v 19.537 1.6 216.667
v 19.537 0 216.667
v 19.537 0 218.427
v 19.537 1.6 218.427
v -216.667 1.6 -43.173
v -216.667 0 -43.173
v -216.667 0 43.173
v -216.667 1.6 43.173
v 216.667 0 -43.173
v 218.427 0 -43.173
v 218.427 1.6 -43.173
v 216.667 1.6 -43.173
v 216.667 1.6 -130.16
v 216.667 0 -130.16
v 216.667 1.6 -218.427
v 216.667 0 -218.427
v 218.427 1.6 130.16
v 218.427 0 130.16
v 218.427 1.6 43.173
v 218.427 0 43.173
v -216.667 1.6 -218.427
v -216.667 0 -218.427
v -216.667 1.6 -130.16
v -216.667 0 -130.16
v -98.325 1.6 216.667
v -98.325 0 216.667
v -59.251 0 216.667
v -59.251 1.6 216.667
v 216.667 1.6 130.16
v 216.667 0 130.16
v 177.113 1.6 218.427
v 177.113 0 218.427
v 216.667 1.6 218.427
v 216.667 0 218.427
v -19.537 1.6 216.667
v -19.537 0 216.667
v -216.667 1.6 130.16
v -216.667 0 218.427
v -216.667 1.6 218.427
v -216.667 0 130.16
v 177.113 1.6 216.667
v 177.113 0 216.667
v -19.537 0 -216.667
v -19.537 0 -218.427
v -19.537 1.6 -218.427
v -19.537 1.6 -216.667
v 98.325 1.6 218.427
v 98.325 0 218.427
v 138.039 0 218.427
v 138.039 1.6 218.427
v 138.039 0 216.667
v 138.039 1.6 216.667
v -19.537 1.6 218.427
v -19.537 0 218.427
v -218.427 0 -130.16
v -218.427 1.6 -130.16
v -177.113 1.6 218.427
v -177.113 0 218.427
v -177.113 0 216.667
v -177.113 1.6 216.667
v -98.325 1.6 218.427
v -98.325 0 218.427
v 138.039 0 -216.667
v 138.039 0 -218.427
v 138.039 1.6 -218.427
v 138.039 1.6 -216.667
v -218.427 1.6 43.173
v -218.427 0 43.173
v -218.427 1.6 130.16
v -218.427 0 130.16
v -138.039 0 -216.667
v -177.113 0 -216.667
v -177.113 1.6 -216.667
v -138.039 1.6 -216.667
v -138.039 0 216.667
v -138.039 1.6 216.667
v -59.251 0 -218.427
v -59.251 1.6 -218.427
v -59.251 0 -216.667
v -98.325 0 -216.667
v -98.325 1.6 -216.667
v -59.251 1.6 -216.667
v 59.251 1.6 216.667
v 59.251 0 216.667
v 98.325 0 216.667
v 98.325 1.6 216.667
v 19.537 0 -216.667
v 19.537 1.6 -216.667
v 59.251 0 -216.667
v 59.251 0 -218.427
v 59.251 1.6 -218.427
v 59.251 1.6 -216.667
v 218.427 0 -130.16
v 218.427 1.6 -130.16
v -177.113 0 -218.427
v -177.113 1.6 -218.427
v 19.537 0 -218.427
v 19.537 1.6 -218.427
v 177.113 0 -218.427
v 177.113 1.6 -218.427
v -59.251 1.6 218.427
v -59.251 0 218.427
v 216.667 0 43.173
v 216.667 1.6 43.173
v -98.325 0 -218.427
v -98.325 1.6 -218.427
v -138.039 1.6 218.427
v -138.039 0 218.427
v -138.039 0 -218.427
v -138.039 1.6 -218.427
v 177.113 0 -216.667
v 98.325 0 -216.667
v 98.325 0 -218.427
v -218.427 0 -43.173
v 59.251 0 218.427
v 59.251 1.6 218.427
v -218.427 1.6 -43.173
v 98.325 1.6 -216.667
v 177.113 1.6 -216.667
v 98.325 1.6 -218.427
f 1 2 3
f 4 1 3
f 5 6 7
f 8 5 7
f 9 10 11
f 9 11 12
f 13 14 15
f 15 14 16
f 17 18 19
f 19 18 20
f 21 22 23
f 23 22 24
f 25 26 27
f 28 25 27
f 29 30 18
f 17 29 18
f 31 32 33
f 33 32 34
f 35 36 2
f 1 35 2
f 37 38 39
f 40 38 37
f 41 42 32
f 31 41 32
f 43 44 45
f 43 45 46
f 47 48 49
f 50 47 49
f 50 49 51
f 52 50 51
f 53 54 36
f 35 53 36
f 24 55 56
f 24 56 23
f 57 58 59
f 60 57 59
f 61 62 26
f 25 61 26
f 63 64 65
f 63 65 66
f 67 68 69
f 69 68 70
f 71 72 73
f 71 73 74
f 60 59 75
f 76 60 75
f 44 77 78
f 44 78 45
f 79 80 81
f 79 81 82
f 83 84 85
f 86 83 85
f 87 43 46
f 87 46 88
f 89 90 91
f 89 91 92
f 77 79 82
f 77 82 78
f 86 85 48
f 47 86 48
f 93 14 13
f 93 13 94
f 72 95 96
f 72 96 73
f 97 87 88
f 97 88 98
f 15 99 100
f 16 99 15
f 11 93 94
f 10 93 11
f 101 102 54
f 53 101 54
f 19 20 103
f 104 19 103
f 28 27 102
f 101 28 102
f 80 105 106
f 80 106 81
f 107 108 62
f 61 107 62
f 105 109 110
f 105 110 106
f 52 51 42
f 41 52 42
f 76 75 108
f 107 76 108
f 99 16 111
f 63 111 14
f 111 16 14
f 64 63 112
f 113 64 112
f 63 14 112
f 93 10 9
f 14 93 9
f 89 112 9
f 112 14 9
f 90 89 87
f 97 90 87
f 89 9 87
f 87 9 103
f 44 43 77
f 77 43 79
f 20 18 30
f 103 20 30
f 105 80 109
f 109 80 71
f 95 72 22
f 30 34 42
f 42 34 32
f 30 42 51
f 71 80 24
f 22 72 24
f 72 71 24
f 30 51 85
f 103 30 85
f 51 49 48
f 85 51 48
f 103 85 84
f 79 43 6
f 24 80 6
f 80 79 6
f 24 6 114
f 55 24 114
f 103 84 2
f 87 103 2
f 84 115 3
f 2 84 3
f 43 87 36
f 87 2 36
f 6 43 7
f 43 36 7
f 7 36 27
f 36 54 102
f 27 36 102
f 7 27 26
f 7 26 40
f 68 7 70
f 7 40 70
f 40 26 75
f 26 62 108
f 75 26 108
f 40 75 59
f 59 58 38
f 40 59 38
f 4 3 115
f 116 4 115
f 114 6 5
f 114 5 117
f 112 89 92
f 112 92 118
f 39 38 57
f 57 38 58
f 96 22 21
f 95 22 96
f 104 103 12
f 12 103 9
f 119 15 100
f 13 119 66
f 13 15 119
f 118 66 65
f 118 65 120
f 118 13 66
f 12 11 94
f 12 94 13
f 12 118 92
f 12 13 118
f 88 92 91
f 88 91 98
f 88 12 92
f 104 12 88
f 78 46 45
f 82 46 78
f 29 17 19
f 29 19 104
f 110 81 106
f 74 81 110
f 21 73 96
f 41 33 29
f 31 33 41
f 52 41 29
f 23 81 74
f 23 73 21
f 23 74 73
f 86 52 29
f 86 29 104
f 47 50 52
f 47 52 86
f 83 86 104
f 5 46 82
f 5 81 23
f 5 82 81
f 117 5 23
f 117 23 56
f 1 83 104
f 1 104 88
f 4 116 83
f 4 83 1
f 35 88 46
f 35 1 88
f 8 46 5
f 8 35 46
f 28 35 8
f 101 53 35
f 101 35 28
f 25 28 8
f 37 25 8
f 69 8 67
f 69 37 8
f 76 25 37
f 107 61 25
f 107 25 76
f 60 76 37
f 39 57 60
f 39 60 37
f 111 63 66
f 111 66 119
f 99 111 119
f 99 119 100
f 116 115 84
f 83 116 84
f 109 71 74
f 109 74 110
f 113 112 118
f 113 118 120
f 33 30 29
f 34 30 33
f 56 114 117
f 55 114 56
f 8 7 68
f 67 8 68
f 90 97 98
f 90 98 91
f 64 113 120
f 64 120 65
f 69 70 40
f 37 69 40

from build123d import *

# Parameters (mm, degrees)
BOSS_EXTRUDE1_DEPTH = 1.6


with BuildPart() as part:
    # oneSide → Boss-Extrude1 (new body)
    with BuildSketch(Plane(origin=(0, 0, 0), x_dir=(1, 0, 0), z_dir=(0, 1, 0))):
        Polygon((-216.6666645, 216.6666645), (-216.6666645, 218.4266645), (-177.1127255, 218.4266645), (-177.1127255, 216.6666645), (-138.0387865, 216.6666645), (-138.0387865, 218.4266645), (-98.3248475, 218.4266645), (-98.3248475, 216.6666645), (-59.2509085, 216.6666645), (-59.2509085, 218.4266645), (-19.5369695, 218.4266645), (-19.5369695, 216.6666645), (19.5369695, 216.6666645), (19.5369695, 218.4266645), (59.2509085, 218.4266645), (59.2509085, 216.6666645), (98.3248475, 216.6666645), (98.3248475, 218.4266645), (138.0387865, 218.4266645), (138.0387865, 216.6666645), (177.1127255, 216.6666645), (177.1127255, 218.4266645), (216.6666645, 218.4266645), (216.6666645, 216.6666645), (216.6666645, 130.1599987), (218.4266645, 130.1599987), (218.4266645, 43.1733329), (216.6666645, 43.1733329), (216.6666645, 0), (-216.6666645, 0), (-216.6666645, 43.1733329), (-218.4266645, 43.1733329), (-218.4266645, 130.1599987), (-216.6666645, 130.1599987), align=None)
    boss_extrude1 = extrude(amount=BOSS_EXTRUDE1_DEPTH)

    # Mirror1: Boss-Extrude1 across plane
    add(boss_extrude1.mirror(Plane(origin=(216.6666645, 1.6, 0), x_dir=(1, 0, 0), z_dir=(0, 0, -1))))


solid = part.part
